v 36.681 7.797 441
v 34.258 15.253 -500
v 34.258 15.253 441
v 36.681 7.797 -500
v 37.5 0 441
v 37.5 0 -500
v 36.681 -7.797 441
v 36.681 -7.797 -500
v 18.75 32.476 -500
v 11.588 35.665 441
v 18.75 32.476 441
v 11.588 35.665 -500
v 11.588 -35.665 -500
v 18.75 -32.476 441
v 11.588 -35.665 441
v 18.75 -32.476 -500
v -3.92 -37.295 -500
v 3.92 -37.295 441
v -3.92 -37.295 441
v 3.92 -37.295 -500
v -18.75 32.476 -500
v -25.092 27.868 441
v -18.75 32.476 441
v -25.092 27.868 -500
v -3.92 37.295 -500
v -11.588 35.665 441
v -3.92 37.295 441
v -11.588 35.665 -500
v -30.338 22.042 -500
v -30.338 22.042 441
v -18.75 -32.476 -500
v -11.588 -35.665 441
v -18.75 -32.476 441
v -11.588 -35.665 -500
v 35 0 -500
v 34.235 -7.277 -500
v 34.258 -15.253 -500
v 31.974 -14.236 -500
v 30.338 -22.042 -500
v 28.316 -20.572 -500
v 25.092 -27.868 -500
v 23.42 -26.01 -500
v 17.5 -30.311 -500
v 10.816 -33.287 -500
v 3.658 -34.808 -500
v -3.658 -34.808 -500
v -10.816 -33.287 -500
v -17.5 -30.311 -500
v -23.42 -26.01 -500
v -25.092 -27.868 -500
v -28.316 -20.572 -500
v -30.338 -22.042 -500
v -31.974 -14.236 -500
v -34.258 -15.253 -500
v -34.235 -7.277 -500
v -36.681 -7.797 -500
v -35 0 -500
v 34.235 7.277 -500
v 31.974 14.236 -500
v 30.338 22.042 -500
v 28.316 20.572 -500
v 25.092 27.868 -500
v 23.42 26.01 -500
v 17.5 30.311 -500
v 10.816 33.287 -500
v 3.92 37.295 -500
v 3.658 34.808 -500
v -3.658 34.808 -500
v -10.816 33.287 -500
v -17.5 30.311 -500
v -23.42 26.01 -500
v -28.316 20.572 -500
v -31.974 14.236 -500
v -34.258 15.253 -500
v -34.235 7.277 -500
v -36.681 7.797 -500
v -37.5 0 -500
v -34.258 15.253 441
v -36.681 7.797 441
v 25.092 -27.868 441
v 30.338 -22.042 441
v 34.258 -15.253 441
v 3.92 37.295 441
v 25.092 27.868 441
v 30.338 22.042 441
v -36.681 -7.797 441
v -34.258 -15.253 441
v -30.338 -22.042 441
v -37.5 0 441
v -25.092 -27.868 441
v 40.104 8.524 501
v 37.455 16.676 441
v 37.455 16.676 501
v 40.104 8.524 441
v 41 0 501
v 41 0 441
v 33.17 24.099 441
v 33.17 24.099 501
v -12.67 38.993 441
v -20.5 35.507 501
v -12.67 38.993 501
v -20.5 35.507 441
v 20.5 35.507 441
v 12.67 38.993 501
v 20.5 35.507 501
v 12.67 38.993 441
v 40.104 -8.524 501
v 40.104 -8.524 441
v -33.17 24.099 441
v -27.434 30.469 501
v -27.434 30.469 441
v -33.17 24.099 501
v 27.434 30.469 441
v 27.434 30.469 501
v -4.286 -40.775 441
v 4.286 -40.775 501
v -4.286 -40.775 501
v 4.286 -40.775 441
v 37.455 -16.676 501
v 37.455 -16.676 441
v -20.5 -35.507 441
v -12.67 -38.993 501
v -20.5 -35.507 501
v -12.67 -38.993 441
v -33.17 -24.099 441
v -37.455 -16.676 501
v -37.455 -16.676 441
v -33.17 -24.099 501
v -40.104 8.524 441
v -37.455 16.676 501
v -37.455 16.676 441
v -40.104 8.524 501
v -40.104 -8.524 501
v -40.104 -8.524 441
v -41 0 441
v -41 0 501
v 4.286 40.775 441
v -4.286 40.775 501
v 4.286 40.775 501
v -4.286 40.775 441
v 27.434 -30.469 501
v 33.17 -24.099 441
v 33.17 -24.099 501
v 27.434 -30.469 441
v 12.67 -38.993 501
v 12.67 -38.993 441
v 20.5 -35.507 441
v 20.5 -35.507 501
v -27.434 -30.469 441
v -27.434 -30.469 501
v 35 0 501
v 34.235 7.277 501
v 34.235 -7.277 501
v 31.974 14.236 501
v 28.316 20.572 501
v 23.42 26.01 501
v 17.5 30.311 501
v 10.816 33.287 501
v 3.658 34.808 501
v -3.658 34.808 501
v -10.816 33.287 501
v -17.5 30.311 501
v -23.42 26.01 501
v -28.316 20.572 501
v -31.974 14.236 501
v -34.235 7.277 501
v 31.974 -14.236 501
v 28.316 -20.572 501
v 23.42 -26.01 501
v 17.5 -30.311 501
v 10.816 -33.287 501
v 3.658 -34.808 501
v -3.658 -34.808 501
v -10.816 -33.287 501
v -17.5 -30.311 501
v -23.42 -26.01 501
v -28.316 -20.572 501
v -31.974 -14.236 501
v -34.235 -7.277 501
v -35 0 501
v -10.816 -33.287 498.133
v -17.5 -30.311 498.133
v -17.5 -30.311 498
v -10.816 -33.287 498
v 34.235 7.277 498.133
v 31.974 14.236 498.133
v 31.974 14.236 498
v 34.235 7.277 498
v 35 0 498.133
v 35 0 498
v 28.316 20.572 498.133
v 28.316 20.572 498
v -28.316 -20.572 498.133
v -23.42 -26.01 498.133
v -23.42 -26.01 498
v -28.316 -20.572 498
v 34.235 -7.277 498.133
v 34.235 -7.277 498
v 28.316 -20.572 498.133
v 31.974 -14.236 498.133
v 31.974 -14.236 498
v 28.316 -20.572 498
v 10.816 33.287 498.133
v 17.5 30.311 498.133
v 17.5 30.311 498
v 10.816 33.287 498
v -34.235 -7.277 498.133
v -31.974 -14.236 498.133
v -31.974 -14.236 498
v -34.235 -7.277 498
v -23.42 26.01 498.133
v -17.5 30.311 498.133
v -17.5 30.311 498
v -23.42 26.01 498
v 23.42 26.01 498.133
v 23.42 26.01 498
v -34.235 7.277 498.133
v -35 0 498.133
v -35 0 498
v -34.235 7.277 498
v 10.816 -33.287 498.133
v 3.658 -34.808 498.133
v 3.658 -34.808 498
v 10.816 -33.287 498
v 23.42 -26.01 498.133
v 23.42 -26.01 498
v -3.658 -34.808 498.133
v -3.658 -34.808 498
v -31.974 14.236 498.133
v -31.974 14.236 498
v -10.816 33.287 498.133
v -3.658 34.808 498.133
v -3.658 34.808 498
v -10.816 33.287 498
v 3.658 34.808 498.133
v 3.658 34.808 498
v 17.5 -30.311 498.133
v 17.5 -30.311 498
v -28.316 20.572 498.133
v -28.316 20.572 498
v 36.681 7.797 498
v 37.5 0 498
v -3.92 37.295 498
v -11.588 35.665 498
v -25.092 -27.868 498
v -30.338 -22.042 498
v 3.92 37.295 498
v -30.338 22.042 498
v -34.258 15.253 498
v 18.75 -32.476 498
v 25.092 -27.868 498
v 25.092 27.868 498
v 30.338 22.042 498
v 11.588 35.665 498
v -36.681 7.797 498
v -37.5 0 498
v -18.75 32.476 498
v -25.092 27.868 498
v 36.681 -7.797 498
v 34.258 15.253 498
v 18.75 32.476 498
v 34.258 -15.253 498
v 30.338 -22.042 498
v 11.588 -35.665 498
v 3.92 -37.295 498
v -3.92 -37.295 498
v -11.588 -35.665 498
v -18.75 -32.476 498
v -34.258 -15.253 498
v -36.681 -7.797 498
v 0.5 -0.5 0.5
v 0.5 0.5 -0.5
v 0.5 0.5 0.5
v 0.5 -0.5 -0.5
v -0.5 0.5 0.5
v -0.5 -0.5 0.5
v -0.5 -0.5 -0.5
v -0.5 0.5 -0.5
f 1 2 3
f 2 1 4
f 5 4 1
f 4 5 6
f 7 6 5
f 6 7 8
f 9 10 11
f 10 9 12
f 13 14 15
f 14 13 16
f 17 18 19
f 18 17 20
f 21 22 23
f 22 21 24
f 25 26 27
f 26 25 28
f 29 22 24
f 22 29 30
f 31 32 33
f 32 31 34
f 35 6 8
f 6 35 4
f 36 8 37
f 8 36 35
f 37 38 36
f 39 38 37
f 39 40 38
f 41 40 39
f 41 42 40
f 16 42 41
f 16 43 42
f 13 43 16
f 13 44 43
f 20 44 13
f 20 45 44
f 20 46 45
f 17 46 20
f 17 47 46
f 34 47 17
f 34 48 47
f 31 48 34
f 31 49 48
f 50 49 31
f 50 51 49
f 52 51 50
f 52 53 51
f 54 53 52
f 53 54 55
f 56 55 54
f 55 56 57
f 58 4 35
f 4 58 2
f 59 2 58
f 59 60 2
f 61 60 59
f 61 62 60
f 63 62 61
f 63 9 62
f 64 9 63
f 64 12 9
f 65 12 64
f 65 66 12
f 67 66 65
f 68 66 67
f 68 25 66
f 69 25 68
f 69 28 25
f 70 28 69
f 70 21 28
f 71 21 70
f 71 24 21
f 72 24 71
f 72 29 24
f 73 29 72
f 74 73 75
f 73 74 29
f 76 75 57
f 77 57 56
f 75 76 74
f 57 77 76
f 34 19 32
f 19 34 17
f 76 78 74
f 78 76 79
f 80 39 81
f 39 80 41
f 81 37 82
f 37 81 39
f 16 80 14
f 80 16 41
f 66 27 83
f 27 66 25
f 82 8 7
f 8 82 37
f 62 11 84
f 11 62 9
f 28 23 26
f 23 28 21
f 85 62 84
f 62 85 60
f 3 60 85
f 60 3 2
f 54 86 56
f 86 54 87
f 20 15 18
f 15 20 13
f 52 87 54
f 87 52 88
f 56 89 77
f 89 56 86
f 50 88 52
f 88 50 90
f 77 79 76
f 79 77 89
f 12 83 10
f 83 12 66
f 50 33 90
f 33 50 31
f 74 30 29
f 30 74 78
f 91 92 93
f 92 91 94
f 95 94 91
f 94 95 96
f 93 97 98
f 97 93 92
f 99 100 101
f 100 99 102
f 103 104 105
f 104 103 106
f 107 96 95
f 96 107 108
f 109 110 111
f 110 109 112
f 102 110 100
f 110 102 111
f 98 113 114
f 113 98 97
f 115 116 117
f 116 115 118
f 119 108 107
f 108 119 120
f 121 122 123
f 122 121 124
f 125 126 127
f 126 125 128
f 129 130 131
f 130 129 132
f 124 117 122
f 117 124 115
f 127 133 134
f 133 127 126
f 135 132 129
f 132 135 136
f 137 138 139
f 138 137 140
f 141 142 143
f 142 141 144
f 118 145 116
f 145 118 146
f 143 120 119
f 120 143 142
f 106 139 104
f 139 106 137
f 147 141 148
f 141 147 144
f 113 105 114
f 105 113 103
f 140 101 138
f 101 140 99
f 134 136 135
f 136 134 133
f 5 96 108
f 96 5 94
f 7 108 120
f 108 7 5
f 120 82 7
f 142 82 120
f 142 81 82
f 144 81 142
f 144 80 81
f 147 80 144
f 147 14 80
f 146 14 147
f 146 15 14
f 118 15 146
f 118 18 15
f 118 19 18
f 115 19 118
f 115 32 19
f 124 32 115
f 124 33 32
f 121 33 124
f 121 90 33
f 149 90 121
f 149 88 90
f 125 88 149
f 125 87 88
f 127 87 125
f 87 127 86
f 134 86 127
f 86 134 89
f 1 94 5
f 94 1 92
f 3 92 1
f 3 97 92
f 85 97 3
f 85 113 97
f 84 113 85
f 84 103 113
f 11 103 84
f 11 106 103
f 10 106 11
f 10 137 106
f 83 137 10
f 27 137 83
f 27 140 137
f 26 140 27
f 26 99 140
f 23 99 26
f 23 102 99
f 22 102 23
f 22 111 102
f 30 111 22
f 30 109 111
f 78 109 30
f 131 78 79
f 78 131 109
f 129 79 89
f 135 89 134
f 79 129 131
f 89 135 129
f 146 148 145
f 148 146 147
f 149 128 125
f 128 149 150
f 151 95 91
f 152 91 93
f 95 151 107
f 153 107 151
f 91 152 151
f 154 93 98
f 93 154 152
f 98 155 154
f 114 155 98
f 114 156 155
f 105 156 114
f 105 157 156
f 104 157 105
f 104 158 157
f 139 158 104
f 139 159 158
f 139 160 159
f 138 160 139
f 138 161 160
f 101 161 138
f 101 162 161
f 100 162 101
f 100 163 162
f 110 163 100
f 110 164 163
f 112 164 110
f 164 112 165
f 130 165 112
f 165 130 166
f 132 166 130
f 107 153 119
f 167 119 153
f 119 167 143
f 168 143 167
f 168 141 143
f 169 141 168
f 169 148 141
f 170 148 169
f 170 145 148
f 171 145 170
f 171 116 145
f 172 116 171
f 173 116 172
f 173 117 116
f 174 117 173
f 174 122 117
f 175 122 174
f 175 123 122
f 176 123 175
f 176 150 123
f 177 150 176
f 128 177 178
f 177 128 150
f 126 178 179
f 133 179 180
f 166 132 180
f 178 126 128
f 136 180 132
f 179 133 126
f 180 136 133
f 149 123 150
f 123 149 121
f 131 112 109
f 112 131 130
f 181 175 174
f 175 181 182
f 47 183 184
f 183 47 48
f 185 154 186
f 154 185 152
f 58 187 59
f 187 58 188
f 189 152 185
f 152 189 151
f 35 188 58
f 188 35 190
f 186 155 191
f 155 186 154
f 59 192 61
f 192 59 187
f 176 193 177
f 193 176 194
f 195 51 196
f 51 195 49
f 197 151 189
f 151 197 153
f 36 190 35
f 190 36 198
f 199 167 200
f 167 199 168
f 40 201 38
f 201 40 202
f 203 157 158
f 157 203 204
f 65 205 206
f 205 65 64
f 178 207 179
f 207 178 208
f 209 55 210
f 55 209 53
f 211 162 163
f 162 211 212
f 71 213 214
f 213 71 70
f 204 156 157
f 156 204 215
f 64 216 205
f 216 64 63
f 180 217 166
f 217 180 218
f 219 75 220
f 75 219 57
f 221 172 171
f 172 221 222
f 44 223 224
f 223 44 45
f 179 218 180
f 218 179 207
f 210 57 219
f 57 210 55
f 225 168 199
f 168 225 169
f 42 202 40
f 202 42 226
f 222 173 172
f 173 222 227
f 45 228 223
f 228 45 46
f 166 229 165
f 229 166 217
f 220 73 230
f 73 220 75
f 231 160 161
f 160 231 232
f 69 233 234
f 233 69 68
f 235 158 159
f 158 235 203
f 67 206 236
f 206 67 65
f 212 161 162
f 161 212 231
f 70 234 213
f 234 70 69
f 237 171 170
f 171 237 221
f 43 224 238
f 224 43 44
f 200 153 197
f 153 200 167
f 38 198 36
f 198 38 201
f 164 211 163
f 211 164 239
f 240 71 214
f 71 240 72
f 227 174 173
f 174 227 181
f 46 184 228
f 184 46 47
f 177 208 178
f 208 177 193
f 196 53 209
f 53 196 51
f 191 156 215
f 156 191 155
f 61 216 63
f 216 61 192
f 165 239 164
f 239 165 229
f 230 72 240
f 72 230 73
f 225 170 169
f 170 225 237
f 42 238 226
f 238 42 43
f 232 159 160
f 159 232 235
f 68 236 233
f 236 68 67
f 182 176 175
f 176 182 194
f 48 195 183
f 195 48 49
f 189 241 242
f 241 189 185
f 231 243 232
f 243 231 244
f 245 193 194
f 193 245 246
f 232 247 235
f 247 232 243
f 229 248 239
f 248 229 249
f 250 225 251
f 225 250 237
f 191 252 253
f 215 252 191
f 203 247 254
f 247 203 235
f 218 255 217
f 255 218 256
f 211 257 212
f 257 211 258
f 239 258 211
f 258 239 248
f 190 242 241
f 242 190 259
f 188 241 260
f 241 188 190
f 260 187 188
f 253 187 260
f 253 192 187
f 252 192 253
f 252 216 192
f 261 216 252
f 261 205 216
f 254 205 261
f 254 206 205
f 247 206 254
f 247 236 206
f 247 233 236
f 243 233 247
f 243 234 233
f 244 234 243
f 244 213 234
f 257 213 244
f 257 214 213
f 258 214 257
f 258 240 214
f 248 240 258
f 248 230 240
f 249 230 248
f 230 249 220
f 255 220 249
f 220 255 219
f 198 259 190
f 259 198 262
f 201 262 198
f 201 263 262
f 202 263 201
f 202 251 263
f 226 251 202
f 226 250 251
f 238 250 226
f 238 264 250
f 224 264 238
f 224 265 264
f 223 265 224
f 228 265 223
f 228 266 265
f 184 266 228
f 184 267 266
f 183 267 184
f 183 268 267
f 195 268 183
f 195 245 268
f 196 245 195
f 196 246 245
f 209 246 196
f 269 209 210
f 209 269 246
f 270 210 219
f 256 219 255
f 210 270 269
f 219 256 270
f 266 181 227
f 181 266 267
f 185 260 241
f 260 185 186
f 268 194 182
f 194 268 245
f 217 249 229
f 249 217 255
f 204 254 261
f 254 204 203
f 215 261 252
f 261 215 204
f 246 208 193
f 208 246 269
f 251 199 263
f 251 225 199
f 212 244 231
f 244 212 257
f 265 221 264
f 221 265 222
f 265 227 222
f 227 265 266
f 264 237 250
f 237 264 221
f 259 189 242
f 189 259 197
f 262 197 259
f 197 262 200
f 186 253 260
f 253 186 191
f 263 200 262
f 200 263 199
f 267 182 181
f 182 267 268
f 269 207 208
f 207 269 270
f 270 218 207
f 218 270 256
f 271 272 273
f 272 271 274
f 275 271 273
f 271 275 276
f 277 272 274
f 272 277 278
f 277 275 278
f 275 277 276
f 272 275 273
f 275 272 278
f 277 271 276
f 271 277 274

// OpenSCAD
// Parameters
pipe_length = 1000; //[500:2000:1]
outer_diameter = 75; //[40:150:1]
wall_thickness = 2.5; //[1.2:5:0.1]
socket_length = 60; //[30:120:1]
socket_outer_diameter = 82; //[75:110:1]
chamfer_length = 2; //[1:6:0.5]
overlap = 1; //[0.5:2:0.1]

// Geometry
module pipe_body() {
  cylinder(h = pipe_length, r = outer_diameter / 2, center = true);
}

module inner_bore() {
  cylinder(h = pipe_length + 2 * overlap, r = outer_diameter / 2 - wall_thickness, center = true);
}

module socket_end() {
  translate([0, 0, pipe_length / 2 - socket_length / 2 + overlap])
    cylinder(h = socket_length, r = socket_outer_diameter / 2, center = true);
}

module chamfer_edges() {
  translate([0, 0, pipe_length / 2 - chamfer_length / 2])
    cylinder(h = chamfer_length, r1 = outer_diameter / 2, r2 = 0, center = true);
}

module markings_text() {
  translate([0, 0, 0])
    cube([overlap, overlap, overlap], center = true);
}

// Operations
module outer_with_socket() {
  union() {
    pipe_body();
    socket_end();
  }
}

module pipe_hollow() {
  difference() {
    outer_with_socket();
    inner_bore();
  }
}

module pipe_with_chamfer_cut() {
  difference() {
    pipe_hollow();
    chamfer_edges();
  }
}

module final_model() {
  union() {
    pipe_with_chamfer_cut();
    markings_text();
  }
}

// Final Output
color([0.85, 0.85, 0.8]) // Off-white color for 3D printed PLA
final_model();
